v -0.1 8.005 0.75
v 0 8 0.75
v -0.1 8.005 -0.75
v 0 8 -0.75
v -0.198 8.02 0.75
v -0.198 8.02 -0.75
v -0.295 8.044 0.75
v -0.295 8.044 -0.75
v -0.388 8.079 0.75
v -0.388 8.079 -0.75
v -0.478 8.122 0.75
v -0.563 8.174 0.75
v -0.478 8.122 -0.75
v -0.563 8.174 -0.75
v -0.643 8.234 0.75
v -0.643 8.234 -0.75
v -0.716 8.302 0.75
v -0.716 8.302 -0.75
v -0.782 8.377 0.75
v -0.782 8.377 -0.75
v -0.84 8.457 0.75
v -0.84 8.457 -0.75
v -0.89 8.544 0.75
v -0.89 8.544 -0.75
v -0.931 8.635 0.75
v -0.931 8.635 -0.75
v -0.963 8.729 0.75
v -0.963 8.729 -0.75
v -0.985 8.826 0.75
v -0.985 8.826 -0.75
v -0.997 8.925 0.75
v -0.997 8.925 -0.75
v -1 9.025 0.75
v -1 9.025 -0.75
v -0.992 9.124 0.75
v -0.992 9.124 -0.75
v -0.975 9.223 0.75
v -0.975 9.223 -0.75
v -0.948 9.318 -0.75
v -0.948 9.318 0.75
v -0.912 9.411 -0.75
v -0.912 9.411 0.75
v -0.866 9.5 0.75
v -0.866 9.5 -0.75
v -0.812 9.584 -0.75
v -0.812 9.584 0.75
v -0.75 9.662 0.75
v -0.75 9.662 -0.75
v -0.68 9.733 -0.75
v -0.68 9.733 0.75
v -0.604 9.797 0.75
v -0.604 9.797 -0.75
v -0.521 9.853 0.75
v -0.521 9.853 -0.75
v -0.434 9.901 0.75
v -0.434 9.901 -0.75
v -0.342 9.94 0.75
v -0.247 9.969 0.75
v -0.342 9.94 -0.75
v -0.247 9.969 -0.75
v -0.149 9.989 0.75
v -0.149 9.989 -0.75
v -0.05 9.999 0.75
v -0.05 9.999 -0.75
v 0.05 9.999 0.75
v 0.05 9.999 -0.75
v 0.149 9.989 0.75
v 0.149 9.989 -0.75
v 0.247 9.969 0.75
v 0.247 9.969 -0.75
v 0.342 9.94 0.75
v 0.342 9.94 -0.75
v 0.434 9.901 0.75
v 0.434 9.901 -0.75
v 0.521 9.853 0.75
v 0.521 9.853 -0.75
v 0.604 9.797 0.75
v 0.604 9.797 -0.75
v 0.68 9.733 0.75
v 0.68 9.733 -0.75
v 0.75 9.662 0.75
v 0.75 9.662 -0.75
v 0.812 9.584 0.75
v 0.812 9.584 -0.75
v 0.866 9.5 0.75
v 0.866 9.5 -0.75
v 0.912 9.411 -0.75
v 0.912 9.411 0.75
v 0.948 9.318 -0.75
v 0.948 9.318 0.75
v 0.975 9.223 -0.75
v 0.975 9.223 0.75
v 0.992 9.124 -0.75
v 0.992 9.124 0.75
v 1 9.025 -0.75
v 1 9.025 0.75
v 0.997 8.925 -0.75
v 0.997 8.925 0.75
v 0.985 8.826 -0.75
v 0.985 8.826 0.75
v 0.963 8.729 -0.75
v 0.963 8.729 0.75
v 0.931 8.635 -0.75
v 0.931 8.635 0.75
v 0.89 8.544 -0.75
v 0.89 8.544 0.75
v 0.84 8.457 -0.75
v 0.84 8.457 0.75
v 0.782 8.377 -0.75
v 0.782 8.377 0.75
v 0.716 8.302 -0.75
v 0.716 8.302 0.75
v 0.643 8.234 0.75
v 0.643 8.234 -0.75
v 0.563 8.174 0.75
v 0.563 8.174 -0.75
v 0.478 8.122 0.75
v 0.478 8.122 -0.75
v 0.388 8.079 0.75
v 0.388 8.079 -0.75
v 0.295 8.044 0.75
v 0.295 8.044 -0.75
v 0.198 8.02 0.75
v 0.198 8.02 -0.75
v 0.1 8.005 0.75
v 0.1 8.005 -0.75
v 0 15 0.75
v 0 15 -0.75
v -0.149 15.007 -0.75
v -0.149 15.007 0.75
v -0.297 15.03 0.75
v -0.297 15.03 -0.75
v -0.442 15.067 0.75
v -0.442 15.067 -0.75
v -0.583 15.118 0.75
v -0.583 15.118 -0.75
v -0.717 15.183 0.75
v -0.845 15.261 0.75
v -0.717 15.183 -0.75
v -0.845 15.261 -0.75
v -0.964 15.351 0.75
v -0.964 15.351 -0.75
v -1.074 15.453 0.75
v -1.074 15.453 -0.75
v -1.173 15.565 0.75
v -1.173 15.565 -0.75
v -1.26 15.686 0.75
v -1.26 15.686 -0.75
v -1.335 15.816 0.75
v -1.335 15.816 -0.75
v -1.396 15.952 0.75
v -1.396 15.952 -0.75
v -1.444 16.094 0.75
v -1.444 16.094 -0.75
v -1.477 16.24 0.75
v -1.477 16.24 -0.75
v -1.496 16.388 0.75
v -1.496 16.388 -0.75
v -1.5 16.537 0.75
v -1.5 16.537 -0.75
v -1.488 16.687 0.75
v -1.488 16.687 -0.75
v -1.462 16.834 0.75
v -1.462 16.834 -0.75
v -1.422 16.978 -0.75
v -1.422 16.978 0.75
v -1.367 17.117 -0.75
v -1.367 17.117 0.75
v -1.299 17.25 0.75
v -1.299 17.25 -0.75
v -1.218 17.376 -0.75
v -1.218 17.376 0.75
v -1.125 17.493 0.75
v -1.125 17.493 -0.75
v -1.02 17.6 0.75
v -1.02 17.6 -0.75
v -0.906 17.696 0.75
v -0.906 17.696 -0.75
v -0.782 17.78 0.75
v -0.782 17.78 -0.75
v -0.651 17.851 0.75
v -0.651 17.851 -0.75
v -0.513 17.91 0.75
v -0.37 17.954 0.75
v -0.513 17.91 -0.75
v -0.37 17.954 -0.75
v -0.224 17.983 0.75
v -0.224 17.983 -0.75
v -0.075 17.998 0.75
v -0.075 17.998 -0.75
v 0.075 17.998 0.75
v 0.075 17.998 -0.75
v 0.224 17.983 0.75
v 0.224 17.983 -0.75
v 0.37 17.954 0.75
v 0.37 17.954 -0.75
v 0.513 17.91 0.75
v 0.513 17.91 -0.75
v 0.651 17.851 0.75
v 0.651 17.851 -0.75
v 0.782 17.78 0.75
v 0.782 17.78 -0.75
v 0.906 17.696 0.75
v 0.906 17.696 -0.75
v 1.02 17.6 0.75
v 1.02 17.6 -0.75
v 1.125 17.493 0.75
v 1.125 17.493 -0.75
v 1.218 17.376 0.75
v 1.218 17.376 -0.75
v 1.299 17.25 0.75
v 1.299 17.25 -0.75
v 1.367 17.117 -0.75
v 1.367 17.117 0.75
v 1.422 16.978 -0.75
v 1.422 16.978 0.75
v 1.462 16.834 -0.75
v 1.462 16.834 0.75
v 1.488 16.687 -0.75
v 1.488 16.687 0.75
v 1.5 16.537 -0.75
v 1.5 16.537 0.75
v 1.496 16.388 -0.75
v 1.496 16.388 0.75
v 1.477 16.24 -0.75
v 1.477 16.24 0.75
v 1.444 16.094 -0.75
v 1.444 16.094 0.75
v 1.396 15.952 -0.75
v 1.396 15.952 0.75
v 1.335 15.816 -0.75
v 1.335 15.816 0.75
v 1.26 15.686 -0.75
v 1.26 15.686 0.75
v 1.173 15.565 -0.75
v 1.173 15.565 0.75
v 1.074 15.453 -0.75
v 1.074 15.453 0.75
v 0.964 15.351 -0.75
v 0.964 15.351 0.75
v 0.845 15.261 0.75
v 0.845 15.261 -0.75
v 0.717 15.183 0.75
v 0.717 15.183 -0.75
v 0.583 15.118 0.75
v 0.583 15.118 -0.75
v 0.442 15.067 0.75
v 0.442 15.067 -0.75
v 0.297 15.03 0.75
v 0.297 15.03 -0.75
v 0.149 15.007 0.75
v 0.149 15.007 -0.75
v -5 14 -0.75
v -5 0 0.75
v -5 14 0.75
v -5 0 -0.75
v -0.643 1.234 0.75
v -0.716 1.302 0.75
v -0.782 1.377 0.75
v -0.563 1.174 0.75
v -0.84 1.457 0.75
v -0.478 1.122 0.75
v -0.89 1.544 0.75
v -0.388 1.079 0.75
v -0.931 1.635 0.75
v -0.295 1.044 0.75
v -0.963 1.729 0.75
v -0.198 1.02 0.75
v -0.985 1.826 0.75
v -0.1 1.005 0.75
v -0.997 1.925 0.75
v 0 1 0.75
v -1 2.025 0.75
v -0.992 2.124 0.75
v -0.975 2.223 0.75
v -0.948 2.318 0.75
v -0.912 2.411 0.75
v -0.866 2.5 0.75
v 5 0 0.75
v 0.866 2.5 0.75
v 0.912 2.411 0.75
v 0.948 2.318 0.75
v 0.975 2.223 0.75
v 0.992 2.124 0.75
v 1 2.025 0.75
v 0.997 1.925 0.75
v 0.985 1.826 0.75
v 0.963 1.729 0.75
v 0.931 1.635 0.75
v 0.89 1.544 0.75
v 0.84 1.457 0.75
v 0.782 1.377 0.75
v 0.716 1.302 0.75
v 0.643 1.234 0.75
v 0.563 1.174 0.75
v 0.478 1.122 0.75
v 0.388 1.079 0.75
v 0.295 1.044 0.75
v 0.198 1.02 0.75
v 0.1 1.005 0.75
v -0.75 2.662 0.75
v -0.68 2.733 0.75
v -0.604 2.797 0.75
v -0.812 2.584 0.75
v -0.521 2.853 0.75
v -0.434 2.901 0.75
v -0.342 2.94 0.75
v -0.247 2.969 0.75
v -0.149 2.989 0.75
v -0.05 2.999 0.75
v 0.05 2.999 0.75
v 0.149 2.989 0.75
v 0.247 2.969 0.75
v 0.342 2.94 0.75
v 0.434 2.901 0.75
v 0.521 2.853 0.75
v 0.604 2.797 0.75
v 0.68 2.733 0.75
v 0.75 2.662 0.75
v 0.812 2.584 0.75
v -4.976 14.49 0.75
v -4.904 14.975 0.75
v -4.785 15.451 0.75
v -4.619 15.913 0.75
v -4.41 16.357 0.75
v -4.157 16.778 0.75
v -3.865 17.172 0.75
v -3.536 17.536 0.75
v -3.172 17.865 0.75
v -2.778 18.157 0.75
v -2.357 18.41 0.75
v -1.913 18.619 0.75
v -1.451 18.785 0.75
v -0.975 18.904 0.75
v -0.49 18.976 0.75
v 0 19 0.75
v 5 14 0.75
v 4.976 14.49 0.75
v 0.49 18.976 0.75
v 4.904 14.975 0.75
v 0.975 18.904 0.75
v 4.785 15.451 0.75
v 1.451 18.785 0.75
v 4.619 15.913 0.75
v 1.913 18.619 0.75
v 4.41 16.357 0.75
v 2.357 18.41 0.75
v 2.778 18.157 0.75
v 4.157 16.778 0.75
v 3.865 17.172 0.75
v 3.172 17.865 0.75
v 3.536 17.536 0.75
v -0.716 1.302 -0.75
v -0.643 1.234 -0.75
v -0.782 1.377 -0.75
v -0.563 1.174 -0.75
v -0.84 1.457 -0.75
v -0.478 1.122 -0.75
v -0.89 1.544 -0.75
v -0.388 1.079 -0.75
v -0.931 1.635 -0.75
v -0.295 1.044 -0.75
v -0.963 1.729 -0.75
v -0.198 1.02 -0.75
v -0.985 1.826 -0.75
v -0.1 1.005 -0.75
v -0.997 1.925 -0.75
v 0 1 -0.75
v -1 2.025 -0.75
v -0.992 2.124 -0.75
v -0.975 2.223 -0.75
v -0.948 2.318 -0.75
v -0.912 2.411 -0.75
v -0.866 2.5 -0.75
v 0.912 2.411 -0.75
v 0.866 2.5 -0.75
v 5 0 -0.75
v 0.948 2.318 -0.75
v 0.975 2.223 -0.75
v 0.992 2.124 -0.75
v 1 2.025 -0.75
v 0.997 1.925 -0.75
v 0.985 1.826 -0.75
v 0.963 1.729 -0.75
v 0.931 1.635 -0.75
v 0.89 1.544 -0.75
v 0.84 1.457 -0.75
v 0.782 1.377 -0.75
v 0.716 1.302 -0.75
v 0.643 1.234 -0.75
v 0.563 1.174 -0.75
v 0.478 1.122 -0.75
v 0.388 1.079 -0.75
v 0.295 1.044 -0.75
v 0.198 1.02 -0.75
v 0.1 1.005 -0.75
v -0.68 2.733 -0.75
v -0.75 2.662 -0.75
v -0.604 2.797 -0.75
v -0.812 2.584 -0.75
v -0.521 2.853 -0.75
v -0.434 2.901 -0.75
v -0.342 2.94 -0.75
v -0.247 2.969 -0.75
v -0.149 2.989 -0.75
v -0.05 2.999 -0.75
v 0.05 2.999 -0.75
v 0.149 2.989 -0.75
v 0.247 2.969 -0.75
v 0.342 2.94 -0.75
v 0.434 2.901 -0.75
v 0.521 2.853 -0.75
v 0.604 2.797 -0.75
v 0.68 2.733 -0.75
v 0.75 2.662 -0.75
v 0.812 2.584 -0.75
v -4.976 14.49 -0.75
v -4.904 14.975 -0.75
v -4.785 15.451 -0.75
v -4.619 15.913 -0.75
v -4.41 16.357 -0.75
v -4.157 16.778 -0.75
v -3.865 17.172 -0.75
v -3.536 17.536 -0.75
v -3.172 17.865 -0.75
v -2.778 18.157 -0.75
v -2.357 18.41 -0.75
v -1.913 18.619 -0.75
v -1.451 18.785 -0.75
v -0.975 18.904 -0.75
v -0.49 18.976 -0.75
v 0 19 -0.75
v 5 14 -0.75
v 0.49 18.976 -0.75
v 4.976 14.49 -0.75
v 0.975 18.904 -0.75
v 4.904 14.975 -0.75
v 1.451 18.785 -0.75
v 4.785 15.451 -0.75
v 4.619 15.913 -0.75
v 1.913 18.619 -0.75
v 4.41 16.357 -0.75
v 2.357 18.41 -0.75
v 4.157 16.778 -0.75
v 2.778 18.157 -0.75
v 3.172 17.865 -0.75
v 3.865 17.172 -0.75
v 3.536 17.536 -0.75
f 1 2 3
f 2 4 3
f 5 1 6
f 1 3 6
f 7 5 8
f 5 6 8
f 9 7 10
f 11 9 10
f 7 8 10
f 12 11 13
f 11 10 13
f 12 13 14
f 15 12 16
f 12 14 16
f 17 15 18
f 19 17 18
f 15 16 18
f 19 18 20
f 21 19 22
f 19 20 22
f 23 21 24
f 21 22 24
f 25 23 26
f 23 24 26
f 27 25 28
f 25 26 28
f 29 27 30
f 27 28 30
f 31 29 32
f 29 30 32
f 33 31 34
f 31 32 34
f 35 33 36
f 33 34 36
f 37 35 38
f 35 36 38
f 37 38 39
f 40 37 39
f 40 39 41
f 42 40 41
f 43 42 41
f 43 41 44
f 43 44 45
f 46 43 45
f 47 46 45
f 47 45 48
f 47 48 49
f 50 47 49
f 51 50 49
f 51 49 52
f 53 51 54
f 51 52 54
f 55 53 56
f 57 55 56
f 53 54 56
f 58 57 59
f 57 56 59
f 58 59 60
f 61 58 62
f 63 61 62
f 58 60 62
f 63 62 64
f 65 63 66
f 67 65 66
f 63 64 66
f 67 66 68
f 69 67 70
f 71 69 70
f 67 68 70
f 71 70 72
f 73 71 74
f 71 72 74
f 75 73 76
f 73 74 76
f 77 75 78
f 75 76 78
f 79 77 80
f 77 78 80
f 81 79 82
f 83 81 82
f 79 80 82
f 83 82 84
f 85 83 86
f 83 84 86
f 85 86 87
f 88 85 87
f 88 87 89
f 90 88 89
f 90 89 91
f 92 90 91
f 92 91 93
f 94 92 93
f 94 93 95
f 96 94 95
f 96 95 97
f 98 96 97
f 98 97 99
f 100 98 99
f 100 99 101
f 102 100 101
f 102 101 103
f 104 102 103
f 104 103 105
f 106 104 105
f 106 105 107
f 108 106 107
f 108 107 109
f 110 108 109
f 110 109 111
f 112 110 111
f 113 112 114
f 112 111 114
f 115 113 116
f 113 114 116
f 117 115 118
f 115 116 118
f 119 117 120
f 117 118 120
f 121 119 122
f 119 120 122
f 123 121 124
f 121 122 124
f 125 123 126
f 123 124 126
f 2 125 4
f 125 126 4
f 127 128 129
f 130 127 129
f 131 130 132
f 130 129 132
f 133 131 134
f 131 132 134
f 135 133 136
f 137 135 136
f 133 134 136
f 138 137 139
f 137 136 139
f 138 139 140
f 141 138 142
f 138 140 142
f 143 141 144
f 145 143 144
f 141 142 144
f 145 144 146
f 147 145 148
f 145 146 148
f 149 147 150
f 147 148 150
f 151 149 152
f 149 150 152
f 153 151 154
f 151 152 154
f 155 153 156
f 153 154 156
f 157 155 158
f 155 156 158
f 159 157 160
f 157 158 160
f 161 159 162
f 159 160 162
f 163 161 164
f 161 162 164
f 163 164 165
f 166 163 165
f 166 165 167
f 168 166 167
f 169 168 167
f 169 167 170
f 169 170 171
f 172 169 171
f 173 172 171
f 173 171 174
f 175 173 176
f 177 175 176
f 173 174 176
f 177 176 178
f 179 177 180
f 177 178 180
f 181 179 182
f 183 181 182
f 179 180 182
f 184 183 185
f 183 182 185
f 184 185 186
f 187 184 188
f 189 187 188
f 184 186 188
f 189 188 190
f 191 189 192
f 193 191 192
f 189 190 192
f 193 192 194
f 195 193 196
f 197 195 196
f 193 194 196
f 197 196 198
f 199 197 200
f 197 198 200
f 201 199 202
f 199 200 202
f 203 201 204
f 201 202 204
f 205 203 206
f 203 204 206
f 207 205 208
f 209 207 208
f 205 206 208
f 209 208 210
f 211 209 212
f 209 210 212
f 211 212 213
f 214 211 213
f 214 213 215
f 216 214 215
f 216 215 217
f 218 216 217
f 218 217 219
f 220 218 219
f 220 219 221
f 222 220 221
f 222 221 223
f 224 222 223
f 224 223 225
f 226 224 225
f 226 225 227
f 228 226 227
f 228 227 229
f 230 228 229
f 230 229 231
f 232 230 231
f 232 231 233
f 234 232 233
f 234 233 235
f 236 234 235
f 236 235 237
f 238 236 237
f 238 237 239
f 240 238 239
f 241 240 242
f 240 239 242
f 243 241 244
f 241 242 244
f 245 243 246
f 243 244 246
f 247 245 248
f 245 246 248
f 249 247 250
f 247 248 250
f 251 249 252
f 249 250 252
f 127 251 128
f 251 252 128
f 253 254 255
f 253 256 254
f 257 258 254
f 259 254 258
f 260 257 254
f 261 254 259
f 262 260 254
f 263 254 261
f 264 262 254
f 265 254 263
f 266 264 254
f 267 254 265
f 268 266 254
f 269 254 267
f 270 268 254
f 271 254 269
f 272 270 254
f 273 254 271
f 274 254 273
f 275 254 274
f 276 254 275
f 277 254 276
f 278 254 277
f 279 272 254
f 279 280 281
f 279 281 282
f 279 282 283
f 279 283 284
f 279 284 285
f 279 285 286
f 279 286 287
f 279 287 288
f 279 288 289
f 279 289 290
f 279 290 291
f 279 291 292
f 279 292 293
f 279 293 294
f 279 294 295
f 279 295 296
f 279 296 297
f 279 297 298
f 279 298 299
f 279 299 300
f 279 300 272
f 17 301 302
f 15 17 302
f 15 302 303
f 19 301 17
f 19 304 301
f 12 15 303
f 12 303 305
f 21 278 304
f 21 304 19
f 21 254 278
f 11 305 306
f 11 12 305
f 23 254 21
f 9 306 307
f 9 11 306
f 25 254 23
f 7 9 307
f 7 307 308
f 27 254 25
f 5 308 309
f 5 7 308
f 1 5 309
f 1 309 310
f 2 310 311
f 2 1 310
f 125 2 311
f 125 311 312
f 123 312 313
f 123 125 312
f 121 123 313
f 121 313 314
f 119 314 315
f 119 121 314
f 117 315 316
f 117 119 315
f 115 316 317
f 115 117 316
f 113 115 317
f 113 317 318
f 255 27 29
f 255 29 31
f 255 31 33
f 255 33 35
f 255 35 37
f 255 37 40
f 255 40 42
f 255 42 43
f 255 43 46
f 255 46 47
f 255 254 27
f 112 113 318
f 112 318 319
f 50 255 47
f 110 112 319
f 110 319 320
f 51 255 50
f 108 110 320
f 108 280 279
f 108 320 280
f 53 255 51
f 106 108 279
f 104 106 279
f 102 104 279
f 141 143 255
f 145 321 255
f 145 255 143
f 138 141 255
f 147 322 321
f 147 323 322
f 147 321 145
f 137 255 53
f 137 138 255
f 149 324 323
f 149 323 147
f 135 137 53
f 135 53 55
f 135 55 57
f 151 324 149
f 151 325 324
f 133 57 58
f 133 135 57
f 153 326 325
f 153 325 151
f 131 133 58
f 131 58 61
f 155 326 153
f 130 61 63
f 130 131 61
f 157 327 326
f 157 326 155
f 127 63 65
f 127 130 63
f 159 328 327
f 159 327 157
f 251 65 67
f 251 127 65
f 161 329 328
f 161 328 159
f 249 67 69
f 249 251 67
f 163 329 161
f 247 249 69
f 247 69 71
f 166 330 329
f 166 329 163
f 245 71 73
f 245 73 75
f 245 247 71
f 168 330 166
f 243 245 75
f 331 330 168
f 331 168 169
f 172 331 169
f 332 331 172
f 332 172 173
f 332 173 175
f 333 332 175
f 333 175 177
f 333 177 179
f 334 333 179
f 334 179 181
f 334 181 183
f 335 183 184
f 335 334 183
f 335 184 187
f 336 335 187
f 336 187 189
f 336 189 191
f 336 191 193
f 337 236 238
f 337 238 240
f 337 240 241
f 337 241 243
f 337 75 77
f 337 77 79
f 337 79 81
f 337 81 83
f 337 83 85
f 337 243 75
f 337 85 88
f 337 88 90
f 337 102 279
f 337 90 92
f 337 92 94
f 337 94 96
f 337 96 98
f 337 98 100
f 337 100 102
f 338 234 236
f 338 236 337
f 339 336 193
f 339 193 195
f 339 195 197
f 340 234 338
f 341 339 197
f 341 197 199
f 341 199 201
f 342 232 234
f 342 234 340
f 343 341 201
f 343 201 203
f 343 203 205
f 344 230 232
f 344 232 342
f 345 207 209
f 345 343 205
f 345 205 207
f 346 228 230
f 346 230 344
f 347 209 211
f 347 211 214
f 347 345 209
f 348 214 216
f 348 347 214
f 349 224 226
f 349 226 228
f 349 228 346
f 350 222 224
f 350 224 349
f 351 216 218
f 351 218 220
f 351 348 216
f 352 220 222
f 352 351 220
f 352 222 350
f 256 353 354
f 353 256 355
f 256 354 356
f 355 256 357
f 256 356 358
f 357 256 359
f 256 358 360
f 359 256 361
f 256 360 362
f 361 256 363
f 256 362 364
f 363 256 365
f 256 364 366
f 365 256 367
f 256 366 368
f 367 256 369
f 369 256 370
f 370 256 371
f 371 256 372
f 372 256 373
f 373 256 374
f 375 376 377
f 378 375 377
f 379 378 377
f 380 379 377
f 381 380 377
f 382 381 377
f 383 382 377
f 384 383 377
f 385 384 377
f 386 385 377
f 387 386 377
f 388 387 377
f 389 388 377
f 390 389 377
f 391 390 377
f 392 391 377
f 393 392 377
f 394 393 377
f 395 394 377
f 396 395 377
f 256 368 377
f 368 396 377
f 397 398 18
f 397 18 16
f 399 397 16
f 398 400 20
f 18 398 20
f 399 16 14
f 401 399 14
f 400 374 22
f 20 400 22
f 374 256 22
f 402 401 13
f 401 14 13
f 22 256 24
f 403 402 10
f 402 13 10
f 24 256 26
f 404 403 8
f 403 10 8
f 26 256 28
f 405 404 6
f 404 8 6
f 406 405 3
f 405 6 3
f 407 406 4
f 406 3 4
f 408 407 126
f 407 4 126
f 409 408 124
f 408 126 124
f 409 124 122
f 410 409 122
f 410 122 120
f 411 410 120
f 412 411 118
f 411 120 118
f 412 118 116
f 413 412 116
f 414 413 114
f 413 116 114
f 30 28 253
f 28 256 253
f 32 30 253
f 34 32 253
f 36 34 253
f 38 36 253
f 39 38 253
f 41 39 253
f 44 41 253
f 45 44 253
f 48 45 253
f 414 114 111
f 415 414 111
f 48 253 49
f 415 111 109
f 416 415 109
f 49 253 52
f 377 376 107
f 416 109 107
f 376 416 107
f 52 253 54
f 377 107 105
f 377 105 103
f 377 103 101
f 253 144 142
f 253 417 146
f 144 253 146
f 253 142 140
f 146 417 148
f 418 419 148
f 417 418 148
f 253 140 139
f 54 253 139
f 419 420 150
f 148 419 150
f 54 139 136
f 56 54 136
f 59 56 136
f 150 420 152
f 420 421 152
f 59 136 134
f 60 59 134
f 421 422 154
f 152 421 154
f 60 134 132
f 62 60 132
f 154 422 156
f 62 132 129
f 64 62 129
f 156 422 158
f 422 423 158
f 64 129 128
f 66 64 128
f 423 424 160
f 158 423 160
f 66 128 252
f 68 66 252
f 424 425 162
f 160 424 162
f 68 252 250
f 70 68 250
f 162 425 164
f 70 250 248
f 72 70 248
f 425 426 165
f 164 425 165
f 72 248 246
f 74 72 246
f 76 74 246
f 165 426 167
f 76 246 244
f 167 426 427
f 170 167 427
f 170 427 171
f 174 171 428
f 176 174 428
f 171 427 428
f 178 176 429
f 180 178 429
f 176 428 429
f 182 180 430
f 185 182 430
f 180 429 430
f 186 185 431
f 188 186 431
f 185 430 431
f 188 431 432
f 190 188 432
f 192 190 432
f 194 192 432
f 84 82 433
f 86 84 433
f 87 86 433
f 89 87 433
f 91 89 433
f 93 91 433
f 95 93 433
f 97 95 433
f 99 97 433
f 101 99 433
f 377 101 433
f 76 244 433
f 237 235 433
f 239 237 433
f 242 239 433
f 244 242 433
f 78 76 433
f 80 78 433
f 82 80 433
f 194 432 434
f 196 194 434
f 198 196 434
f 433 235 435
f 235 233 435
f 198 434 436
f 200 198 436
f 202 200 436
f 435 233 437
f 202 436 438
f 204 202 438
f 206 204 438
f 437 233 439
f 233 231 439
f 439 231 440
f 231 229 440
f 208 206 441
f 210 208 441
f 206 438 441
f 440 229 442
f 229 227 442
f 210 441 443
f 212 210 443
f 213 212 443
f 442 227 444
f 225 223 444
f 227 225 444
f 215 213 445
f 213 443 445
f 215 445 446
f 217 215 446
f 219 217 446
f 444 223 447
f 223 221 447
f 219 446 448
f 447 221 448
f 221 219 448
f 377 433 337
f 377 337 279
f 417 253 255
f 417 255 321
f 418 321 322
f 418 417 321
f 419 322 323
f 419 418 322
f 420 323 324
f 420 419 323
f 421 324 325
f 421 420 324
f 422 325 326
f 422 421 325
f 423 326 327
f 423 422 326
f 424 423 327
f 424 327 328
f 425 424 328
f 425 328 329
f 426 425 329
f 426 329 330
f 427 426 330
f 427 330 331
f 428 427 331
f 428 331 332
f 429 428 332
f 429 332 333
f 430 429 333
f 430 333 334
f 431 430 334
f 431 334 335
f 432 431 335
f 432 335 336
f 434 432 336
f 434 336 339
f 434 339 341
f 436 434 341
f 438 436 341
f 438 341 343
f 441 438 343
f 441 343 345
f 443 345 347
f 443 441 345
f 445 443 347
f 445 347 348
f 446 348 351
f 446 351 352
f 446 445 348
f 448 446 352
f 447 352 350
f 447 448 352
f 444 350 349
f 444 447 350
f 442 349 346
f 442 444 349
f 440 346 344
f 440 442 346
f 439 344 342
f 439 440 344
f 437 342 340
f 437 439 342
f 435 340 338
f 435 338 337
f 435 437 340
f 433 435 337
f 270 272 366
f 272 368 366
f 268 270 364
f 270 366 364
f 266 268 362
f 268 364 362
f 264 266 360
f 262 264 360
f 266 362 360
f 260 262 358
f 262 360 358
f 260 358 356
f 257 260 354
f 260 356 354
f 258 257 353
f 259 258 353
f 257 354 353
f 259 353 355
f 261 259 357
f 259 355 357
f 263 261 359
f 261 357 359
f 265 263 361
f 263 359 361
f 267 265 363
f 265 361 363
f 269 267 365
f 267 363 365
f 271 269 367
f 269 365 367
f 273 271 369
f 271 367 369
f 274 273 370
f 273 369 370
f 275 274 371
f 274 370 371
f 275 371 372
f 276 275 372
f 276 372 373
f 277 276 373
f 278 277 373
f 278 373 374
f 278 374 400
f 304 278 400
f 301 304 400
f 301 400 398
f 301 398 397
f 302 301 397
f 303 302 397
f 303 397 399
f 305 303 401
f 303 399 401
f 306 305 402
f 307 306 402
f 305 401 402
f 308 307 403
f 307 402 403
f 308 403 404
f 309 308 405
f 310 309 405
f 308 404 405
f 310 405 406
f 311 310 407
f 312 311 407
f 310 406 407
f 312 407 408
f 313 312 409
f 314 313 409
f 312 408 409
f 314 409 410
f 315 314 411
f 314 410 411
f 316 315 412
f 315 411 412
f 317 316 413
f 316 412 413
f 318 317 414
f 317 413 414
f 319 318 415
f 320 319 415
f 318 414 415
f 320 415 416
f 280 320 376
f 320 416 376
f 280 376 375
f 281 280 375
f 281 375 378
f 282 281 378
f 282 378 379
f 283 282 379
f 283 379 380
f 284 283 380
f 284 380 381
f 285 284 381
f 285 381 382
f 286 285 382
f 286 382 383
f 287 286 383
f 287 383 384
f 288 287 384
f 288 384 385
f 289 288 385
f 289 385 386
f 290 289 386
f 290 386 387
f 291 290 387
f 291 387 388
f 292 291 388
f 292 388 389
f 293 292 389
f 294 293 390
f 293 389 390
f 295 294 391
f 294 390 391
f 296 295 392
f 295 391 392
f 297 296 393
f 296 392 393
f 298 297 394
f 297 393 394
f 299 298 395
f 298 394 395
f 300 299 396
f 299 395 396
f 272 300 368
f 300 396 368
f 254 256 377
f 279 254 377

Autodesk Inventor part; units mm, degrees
ref_plane "YZ Plane" through (0, 0, 0) normal (1, 0, 0) x (0, 1, 0)
ref_plane "XZ Plane" through (0, 0, 0) normal (0, 1, 0) x (-1, 0, 0)
ref_plane "XY Plane" through (0, 0, 0) normal (0, 0, 1) x (1, 0, 0)
sketch "Náčrt1" plane through (0, 0, 0) normal (0, 0, 1) x (1, 0, 0)
  line L0 (0, 19) -> (0, 19)
  line L1 (5, 14) -> (5, 0)
  line L2 (0, -19) -> (0, -19)
  line L3 (-5, 0) -> (-5, 14)
  line L4 (-8.4497, 0) -> (8.4497, 0) projected
  line L5 (0, 27.8426) -> (0, -26.8071) projected
  arc A0 (0, 19) -> (-5, 14) centre (0, 14) ccw
  arc A1 (5, 14) -> (0, 19) centre (0, 14) ccw
  line L6 (-5, 0) -> (5, 0)
  point P0 (0, 0)
  point P1 (-5, 19)
  point P2 (5, -19)
  point P3 (5, 19)
  point P4 (0, 19)
  dimension "d2" = 5
  dimension "d12" = 14
  dimension "d13" = 10
extrude "Vysunutí1" add sketch "Náčrt1" along normal mid plane 1.5
sketch "Náčrt2" plane through (0, 0, 0.75) normal (0, 0, 1) x (1, 0, 0)
  line L0 (5, 0) -> (5, 14) projected
  arc A0 (5, 14) -> (-5, 14) centre (0, 14) ccw projected
  line L1 (-5, 14) -> (-5, 0) projected
  line L2 (-5, 0) -> (5, 0) projected
  line L3 (-7, 0) -> (7, 0) projected
  line L4 (0, 25.3) -> (0, -18.8) projected
  point P0 (0, 0)
  point P1 (0, -12.5)
  point P2 (0, 16.5)
  dimension "d23" = 2.5
hole "Díra1" at (0, -12.5, 0.75) at (0, 16.5, 0.75) direction (0, 0, -1) diameter 3 end through all
sketch "Náčrt3" plane through (0, 0, 0.75) normal (0, 0, 1) x (1, 0, 0)
  line L0 (-5, 14) -> (-5, 0) projected
  line L1 (-5, 0) -> (5, 0) projected
  line L2 (5, 0) -> (5, 14) projected
  arc A0 (5, 14) -> (-5, 14) centre (0, 14) ccw projected
  point P0 (0, 0)
  point P1 (0, 2)
  point P2 (0, 9)
  dimension "d14" = 2
  dimension "d15" = 7
hole "Díra2" at (0, 2, 0.75) at (0, 9, 0.75) direction (0, 0, -1) diameter 2 end through all
properties part number "lifter_servo_end" material "Hliník 6061"
